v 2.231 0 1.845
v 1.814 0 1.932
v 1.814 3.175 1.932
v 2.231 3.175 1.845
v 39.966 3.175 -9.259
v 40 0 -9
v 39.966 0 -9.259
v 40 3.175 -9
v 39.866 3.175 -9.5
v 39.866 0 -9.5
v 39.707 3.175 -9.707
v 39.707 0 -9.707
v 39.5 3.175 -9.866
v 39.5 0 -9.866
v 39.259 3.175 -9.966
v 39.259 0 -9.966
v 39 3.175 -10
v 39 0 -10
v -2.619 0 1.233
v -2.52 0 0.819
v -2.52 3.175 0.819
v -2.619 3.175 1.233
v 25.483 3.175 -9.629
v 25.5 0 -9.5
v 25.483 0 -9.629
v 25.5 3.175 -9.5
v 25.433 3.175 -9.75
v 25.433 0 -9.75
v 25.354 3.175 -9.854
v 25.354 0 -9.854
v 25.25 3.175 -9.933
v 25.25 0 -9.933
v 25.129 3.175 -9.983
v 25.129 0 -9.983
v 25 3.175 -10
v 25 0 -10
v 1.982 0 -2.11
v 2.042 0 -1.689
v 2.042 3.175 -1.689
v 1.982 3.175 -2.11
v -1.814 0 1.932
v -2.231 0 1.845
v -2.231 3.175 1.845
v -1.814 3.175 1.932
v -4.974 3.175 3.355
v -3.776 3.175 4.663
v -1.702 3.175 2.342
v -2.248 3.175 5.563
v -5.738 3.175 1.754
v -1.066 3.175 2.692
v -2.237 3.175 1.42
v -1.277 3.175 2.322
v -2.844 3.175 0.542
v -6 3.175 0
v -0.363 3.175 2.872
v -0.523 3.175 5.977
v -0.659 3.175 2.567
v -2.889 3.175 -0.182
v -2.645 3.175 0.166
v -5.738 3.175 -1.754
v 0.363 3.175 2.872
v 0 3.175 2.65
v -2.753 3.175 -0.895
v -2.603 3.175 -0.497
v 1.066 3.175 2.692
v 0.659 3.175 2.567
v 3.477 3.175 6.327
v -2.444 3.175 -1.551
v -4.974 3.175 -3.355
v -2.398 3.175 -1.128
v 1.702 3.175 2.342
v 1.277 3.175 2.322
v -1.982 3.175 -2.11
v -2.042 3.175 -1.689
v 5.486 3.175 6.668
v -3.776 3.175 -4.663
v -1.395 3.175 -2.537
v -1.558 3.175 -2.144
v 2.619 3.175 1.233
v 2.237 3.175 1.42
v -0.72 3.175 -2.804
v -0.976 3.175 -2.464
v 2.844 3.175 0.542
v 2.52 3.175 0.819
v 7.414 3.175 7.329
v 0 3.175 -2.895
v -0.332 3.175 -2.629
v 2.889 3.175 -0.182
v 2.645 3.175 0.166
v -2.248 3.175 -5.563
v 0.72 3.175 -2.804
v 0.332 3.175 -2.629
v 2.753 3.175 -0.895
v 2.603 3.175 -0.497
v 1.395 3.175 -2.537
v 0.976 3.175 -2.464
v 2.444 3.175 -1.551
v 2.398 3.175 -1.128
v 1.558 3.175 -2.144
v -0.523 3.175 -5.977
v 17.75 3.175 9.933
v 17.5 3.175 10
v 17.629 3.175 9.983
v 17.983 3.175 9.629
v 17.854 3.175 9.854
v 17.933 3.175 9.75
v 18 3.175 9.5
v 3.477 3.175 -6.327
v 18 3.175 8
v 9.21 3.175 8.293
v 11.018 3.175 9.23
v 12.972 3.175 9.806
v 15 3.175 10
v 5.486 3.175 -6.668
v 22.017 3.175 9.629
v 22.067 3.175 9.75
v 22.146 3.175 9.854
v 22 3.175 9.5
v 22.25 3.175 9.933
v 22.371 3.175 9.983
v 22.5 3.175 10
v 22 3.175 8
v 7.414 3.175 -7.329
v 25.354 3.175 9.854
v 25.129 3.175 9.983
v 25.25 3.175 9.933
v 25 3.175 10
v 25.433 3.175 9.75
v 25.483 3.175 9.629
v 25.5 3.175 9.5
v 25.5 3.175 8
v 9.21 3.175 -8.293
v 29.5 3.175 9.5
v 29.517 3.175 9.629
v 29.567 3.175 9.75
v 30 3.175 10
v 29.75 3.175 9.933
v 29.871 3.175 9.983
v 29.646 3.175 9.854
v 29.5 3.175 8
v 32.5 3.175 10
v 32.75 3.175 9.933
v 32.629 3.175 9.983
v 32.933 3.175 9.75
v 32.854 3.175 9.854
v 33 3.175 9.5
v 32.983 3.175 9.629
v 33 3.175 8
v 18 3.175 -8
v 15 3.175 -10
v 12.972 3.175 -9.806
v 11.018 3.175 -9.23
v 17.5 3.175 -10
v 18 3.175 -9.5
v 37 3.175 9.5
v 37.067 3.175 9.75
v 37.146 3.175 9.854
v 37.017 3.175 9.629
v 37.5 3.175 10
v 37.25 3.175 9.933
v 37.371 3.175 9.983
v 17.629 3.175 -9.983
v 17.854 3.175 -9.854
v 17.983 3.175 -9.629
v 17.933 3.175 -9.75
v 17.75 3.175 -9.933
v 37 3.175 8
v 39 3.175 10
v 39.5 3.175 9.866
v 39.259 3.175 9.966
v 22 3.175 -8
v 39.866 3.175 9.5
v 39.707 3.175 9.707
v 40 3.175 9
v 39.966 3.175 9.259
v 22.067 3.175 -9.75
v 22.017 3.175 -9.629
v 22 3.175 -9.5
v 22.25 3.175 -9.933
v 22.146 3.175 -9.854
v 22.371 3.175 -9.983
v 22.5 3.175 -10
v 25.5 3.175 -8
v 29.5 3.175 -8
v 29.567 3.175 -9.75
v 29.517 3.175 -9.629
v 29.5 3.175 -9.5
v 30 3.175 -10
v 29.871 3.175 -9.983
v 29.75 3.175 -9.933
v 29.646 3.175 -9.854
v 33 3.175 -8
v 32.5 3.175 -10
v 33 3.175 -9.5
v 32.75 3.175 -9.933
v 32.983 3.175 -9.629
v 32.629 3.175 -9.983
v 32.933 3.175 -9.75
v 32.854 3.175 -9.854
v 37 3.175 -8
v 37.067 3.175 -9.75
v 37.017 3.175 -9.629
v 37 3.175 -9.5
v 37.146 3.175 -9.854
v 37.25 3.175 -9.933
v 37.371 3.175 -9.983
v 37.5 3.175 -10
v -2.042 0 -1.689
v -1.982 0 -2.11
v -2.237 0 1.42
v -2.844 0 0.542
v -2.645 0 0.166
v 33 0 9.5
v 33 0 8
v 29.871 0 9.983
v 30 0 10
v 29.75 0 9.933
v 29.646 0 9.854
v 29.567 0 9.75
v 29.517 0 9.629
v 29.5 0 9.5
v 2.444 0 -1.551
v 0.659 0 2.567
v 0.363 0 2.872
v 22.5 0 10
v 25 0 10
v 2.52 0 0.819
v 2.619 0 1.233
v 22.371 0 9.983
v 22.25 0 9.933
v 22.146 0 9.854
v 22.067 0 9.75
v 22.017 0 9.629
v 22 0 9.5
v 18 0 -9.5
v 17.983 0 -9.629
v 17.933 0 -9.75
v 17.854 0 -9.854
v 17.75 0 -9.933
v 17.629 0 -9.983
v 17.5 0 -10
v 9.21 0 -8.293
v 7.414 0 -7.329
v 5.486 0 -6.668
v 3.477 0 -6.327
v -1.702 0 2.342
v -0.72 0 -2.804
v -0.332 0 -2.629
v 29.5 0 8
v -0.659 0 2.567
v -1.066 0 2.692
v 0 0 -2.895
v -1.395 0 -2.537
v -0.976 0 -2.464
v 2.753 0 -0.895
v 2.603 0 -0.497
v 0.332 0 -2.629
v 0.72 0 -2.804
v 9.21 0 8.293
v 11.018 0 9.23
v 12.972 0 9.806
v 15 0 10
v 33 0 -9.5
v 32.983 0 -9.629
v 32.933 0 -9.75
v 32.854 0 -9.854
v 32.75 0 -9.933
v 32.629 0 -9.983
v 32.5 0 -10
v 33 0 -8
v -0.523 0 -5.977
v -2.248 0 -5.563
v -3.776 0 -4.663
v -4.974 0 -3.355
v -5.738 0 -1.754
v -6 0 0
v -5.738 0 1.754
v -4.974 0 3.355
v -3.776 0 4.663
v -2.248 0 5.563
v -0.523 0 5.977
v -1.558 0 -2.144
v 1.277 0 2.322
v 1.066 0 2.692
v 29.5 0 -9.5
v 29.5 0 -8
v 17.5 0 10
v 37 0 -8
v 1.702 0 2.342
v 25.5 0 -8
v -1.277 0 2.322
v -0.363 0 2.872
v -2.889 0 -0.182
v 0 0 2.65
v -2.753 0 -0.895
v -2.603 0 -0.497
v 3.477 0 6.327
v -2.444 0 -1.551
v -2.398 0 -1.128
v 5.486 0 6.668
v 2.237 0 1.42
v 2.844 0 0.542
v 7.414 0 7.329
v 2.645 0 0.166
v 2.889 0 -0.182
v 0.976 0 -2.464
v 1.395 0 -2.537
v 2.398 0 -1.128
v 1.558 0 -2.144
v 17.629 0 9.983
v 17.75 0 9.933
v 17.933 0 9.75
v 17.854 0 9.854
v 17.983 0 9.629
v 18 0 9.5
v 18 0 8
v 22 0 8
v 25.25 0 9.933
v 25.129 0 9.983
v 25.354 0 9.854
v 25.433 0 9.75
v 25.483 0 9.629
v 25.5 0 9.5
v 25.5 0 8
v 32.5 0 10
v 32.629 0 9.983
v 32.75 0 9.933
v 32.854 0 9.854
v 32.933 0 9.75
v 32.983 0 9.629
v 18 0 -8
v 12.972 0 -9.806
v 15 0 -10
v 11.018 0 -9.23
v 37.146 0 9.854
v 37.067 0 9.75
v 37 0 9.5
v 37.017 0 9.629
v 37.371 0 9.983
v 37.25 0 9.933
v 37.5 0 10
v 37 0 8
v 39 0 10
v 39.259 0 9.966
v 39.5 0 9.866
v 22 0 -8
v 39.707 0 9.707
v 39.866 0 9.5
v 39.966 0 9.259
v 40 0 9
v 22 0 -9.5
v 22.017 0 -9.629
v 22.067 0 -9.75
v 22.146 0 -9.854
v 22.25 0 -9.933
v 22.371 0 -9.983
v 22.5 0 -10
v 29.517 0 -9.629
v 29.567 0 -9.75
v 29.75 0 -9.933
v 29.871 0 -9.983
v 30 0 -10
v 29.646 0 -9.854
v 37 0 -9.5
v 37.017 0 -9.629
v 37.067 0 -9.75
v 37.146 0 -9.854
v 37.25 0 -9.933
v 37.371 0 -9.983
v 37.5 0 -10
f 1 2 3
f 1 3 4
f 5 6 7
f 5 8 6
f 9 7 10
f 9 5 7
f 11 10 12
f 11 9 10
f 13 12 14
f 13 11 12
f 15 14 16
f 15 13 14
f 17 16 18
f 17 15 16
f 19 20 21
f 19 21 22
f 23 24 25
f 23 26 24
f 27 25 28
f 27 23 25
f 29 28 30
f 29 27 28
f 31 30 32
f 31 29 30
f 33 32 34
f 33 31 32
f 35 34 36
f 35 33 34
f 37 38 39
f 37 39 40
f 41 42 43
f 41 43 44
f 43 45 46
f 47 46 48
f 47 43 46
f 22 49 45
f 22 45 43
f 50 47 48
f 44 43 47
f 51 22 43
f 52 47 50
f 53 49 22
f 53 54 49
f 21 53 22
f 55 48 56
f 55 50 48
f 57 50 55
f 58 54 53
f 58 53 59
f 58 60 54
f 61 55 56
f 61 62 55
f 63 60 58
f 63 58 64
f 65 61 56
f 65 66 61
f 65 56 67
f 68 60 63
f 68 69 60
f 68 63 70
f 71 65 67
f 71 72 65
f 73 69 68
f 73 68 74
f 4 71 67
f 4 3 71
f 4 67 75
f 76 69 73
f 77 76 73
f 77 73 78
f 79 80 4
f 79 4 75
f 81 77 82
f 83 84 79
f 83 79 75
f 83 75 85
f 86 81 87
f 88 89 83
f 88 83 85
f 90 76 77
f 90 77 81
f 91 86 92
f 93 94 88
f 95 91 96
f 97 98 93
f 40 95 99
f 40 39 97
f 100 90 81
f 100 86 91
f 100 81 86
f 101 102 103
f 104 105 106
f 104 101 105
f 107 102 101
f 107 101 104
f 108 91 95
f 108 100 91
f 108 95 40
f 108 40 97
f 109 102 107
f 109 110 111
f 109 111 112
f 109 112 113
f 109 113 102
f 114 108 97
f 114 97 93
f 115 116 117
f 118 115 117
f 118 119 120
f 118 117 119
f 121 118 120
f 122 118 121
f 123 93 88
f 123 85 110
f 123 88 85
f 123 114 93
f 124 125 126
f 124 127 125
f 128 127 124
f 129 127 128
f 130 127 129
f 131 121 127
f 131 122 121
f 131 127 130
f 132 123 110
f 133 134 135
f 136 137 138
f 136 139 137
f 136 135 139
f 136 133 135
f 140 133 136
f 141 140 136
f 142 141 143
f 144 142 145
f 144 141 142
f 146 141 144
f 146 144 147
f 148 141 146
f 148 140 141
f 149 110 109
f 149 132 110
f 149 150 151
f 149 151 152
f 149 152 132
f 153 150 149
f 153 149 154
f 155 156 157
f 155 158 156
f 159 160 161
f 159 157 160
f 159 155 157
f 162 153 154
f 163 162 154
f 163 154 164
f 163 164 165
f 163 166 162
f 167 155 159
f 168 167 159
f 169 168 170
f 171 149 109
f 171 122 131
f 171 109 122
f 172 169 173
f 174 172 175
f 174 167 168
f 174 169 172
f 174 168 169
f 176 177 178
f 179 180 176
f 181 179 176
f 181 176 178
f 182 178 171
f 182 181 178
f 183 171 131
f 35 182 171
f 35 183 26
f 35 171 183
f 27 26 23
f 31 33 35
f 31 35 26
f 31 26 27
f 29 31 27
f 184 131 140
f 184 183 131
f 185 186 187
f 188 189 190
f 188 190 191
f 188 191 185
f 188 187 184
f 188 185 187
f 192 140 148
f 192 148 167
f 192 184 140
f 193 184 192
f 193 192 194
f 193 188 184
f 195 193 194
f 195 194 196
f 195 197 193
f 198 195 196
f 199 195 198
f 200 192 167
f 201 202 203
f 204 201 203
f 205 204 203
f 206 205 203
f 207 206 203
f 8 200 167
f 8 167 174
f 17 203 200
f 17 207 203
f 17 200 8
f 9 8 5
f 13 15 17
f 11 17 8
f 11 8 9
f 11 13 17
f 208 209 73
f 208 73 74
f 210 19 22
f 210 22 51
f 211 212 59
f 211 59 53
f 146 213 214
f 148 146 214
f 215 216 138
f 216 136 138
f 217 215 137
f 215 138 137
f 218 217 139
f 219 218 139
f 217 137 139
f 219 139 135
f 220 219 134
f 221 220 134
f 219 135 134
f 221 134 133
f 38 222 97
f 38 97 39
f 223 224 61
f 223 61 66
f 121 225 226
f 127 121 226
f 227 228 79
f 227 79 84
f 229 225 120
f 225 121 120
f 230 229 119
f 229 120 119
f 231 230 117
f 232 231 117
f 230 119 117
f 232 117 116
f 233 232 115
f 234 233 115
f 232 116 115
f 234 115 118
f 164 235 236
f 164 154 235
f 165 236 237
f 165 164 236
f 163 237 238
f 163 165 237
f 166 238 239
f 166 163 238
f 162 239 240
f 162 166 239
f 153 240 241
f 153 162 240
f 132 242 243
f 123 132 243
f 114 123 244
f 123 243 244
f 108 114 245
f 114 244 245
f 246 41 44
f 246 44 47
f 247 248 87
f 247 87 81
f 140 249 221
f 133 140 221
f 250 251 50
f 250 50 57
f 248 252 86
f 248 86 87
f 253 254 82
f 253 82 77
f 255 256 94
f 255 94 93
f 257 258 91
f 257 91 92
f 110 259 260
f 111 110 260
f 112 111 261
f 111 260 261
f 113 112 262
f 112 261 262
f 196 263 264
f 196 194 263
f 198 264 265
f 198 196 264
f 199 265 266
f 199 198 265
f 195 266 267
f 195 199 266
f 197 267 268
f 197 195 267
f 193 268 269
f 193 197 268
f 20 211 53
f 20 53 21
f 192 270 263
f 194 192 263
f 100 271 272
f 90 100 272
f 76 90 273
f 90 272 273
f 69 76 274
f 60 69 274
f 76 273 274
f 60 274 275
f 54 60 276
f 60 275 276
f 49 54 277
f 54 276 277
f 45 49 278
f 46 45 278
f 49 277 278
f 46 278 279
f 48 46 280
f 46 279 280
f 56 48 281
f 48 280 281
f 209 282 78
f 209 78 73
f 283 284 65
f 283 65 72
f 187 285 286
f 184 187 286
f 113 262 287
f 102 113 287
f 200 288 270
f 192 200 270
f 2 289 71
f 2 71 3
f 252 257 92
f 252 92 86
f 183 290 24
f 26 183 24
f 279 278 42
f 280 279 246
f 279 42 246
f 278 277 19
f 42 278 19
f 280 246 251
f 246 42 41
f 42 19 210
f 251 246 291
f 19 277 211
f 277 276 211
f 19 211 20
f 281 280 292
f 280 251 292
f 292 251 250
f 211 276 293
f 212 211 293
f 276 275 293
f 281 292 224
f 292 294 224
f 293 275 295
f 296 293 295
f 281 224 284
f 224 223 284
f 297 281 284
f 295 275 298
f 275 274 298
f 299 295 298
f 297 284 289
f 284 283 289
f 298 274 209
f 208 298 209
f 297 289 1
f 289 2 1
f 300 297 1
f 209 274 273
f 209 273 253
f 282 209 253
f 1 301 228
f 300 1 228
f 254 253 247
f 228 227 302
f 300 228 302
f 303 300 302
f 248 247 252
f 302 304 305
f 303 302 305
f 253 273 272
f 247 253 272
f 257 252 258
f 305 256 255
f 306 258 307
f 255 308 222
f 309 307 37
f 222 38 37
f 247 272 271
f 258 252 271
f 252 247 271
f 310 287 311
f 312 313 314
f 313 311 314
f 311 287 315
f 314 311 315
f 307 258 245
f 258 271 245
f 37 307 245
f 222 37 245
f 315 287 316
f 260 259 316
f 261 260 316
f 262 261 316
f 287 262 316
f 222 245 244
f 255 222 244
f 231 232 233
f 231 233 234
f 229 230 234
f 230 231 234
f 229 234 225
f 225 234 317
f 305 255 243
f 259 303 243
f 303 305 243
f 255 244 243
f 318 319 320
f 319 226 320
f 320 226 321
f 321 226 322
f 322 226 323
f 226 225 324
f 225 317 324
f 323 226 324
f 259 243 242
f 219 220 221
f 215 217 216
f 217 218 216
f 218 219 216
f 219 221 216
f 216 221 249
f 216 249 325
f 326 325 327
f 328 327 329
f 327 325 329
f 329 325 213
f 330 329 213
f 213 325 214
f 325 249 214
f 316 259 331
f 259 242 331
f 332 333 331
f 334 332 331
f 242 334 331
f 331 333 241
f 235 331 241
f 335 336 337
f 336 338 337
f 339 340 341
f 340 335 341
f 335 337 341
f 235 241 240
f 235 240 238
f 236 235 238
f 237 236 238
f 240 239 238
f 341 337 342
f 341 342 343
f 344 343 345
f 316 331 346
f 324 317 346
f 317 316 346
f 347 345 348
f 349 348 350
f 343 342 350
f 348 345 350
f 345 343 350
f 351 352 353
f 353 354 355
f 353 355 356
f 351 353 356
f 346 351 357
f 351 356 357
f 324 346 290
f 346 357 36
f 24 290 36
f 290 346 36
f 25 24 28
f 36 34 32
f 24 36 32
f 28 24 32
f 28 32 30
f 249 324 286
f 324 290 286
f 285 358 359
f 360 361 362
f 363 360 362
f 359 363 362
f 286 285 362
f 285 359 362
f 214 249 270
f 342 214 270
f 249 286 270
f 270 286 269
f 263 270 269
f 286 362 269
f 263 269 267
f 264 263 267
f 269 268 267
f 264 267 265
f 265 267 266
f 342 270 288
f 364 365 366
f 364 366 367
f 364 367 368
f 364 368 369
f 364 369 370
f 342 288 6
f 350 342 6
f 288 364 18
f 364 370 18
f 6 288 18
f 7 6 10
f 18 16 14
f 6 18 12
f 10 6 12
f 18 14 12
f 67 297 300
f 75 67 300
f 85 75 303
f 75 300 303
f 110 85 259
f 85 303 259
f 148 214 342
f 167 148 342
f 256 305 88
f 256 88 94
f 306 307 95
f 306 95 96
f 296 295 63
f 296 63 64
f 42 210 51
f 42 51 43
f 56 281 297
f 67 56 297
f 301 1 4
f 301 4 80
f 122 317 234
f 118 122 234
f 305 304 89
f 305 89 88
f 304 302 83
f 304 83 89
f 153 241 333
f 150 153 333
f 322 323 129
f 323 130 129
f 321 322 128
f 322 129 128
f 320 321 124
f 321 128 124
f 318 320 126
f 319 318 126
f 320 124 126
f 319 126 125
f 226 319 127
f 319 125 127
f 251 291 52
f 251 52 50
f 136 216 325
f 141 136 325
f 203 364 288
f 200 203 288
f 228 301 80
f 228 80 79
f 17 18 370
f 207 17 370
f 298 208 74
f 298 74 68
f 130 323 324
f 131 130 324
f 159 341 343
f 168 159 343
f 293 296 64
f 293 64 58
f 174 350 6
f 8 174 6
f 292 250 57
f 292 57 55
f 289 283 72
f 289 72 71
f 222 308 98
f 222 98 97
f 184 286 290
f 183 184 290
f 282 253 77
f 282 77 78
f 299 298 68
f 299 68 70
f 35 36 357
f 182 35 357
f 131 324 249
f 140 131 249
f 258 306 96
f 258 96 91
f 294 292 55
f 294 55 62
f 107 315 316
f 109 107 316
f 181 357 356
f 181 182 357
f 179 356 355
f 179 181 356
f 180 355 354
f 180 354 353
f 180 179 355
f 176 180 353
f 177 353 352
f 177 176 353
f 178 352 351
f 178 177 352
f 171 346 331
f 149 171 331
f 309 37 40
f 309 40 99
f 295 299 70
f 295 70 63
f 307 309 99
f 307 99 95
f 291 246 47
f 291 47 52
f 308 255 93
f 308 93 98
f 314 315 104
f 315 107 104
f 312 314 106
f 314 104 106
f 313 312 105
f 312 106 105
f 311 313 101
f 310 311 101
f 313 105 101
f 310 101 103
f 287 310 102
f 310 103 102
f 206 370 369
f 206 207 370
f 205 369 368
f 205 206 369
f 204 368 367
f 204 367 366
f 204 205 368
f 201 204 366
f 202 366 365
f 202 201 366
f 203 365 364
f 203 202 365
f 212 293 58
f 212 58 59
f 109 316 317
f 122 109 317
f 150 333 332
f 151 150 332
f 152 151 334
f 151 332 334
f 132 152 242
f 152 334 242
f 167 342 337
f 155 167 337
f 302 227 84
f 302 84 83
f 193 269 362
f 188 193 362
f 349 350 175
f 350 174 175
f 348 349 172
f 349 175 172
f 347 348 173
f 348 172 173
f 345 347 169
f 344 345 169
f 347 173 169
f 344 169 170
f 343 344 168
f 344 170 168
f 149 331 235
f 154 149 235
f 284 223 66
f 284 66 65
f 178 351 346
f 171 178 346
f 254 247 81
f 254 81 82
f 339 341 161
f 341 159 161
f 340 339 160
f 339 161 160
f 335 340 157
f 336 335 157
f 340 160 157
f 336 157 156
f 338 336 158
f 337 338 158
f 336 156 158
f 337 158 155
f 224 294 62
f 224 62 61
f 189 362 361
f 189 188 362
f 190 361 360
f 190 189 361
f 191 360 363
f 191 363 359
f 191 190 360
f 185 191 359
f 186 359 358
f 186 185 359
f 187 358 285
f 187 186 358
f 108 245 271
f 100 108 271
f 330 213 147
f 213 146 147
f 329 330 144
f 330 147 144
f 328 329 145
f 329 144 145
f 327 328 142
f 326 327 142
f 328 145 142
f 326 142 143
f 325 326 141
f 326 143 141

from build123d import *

# Parameters (mm, degrees)
BOSS_EXTRUDE1_DEPTH = 3.175
FILLET2_R           = 1
FILLET3_R           = 0.5


with BuildPart() as part:
    # Sketch1 → Boss-Extrude1 (new body)
    with BuildSketch(Plane(origin=(0, 0, 0), x_dir=(1, 0, 0), z_dir=(0, 1, 0))):
        with BuildLine():
            Line((40, -10), (40, 10))
            Line((40, 10), (37, 10))
            Line((37, 10), (37, 8))
            Line((37, 8), (33, 8))
            Line((33, 8), (33, 10))
            Line((33, 10), (29.5, 10))
            Line((29.5, 10), (29.5, 8))
            Line((29.5, 8), (25.5, 8))
            Line((25.5, 8), (25.5, 10))
            Line((25.5, 10), (22, 10))
            Line((22, 10), (22, 8))
            Line((22, 8), (18, 8))
            Line((18, 8), (18, 10))
            Line((18, 10), (15, 10))
            ThreePointArc((15, 10), (11.981600452, 9.564316032), (9.209618064, 8.29283265))
            ThreePointArc((9.209618064, 8.29283265), (6.463385686, 6.959896642), (3.477065544, 6.327122843))
            Line((3.477065544, 6.327122843), (-0.522934456, 5.977168189))
            ThreePointArc((-0.522934456, 5.977168189), (-6, 0), (-0.522934456, -5.977168189))
            Line((-0.522934456, -5.977168189), (3.477065544, -6.327122843))
            ThreePointArc((3.477065544, -6.327122843), (6.463385686, -6.959896642), (9.209618064, -8.29283265))
            ThreePointArc((9.209618064, -8.29283265), (11.981600452, -9.564316032), (15, -10))
            Line((15, -10), (18, -10))
            Line((18, -10), (18, -8))
            Line((18, -8), (22, -8))
            Line((22, -8), (22, -10))
            Line((22, -10), (25.5, -10))
            Line((25.5, -10), (25.5, -8))
            Line((25.5, -8), (29.5, -8))
            Line((29.5, -8), (29.5, -10))
            Line((29.5, -10), (33, -10))
            Line((33, -10), (33, -8))
            Line((33, -8), (37, -8))
            Line((37, -8), (37, -10))
            Line((37, -10), (40, -10))
        make_face()
        Polygon((0, 2.895), (-0.332133069, 2.629103958), (-0.719957223, 2.804048251), (-0.975530065, 2.463907688), (-1.394676887, 2.536907839), (-1.557630919, 2.143895035), (-1.981763872, 2.110364176), (-2.041860093, 1.689173573), (-2.444329344, 1.551218571), (-2.397791689, 1.128315123), (-2.753308615, 0.894604199), (-2.603061214, 0.496560484), (-2.889287379, 0.181778554), (-2.64477083, -0.166394877), (-2.843721591, -0.542468906), (-2.520299768, -0.818895035), (-2.619474317, -1.232631049), (-2.237469003, -1.419941007), (-2.230635838, -1.84534245), (-1.814049831, -1.931766863), (-1.701638305, -2.342104199), (-1.276647236, -2.322212702), (-1.06572058, -2.691702927), (-0.659028201, -2.566745377), (-0.362839711, -2.87217206), (0, -2.65), (0.362839711, -2.87217206), (0.659028201, -2.566745377), (1.06572058, -2.691702927), (1.276647236, -2.322212702), (1.701638305, -2.342104199), (1.814049831, -1.931766863), (2.230635838, -1.84534245), (2.237469003, -1.419941007), (2.619474317, -1.232631049), (2.520299768, -0.818895035), (2.843721591, -0.542468906), (2.64477083, -0.166394877), (2.889287379, 0.181778554), (2.603061214, 0.496560484), (2.753308615, 0.894604199), (2.397791689, 1.128315123), (2.444329344, 1.551218571), (2.041860093, 1.689173573), (1.981763872, 2.110364176), (1.557630919, 2.143895035), (1.394676887, 2.536907839), (0.975530065, 2.463907688), (0.719957223, 2.804048251), (0.332133069, 2.629103958), align=None, mode=Mode.SUBTRACT)
    extrude(amount=BOSS_EXTRUDE1_DEPTH)

    # Fillet2
    fillet2_edges = [part.edges().sort_by_distance(p)[0] for p in [
        (40, 1.5875, -10),
        (40, 1.5875, 10),
    ]]
    fillet(fillet2_edges, radius=FILLET2_R)

    # Fillet3
    fillet3_edges = [part.edges().sort_by_distance(p)[0] for p in [
        (37, 1.5875, -10),
        (37, 1.5875, 10),
        (33, 1.5875, 10),
        (29.5, 1.5875, 10),
        (25.5, 1.5875, 10),
        (22, 1.5875, 10),
        (18, 1.5875, 10),
        (18, 1.5875, -10),
        (22, 1.5875, -10),
        (25.5, 1.5875, -10),
        (29.5, 1.5875, -10),
        (33, 1.5875, -10),
    ]]
    fillet(fillet3_edges, radius=FILLET3_R)


solid = part.part
